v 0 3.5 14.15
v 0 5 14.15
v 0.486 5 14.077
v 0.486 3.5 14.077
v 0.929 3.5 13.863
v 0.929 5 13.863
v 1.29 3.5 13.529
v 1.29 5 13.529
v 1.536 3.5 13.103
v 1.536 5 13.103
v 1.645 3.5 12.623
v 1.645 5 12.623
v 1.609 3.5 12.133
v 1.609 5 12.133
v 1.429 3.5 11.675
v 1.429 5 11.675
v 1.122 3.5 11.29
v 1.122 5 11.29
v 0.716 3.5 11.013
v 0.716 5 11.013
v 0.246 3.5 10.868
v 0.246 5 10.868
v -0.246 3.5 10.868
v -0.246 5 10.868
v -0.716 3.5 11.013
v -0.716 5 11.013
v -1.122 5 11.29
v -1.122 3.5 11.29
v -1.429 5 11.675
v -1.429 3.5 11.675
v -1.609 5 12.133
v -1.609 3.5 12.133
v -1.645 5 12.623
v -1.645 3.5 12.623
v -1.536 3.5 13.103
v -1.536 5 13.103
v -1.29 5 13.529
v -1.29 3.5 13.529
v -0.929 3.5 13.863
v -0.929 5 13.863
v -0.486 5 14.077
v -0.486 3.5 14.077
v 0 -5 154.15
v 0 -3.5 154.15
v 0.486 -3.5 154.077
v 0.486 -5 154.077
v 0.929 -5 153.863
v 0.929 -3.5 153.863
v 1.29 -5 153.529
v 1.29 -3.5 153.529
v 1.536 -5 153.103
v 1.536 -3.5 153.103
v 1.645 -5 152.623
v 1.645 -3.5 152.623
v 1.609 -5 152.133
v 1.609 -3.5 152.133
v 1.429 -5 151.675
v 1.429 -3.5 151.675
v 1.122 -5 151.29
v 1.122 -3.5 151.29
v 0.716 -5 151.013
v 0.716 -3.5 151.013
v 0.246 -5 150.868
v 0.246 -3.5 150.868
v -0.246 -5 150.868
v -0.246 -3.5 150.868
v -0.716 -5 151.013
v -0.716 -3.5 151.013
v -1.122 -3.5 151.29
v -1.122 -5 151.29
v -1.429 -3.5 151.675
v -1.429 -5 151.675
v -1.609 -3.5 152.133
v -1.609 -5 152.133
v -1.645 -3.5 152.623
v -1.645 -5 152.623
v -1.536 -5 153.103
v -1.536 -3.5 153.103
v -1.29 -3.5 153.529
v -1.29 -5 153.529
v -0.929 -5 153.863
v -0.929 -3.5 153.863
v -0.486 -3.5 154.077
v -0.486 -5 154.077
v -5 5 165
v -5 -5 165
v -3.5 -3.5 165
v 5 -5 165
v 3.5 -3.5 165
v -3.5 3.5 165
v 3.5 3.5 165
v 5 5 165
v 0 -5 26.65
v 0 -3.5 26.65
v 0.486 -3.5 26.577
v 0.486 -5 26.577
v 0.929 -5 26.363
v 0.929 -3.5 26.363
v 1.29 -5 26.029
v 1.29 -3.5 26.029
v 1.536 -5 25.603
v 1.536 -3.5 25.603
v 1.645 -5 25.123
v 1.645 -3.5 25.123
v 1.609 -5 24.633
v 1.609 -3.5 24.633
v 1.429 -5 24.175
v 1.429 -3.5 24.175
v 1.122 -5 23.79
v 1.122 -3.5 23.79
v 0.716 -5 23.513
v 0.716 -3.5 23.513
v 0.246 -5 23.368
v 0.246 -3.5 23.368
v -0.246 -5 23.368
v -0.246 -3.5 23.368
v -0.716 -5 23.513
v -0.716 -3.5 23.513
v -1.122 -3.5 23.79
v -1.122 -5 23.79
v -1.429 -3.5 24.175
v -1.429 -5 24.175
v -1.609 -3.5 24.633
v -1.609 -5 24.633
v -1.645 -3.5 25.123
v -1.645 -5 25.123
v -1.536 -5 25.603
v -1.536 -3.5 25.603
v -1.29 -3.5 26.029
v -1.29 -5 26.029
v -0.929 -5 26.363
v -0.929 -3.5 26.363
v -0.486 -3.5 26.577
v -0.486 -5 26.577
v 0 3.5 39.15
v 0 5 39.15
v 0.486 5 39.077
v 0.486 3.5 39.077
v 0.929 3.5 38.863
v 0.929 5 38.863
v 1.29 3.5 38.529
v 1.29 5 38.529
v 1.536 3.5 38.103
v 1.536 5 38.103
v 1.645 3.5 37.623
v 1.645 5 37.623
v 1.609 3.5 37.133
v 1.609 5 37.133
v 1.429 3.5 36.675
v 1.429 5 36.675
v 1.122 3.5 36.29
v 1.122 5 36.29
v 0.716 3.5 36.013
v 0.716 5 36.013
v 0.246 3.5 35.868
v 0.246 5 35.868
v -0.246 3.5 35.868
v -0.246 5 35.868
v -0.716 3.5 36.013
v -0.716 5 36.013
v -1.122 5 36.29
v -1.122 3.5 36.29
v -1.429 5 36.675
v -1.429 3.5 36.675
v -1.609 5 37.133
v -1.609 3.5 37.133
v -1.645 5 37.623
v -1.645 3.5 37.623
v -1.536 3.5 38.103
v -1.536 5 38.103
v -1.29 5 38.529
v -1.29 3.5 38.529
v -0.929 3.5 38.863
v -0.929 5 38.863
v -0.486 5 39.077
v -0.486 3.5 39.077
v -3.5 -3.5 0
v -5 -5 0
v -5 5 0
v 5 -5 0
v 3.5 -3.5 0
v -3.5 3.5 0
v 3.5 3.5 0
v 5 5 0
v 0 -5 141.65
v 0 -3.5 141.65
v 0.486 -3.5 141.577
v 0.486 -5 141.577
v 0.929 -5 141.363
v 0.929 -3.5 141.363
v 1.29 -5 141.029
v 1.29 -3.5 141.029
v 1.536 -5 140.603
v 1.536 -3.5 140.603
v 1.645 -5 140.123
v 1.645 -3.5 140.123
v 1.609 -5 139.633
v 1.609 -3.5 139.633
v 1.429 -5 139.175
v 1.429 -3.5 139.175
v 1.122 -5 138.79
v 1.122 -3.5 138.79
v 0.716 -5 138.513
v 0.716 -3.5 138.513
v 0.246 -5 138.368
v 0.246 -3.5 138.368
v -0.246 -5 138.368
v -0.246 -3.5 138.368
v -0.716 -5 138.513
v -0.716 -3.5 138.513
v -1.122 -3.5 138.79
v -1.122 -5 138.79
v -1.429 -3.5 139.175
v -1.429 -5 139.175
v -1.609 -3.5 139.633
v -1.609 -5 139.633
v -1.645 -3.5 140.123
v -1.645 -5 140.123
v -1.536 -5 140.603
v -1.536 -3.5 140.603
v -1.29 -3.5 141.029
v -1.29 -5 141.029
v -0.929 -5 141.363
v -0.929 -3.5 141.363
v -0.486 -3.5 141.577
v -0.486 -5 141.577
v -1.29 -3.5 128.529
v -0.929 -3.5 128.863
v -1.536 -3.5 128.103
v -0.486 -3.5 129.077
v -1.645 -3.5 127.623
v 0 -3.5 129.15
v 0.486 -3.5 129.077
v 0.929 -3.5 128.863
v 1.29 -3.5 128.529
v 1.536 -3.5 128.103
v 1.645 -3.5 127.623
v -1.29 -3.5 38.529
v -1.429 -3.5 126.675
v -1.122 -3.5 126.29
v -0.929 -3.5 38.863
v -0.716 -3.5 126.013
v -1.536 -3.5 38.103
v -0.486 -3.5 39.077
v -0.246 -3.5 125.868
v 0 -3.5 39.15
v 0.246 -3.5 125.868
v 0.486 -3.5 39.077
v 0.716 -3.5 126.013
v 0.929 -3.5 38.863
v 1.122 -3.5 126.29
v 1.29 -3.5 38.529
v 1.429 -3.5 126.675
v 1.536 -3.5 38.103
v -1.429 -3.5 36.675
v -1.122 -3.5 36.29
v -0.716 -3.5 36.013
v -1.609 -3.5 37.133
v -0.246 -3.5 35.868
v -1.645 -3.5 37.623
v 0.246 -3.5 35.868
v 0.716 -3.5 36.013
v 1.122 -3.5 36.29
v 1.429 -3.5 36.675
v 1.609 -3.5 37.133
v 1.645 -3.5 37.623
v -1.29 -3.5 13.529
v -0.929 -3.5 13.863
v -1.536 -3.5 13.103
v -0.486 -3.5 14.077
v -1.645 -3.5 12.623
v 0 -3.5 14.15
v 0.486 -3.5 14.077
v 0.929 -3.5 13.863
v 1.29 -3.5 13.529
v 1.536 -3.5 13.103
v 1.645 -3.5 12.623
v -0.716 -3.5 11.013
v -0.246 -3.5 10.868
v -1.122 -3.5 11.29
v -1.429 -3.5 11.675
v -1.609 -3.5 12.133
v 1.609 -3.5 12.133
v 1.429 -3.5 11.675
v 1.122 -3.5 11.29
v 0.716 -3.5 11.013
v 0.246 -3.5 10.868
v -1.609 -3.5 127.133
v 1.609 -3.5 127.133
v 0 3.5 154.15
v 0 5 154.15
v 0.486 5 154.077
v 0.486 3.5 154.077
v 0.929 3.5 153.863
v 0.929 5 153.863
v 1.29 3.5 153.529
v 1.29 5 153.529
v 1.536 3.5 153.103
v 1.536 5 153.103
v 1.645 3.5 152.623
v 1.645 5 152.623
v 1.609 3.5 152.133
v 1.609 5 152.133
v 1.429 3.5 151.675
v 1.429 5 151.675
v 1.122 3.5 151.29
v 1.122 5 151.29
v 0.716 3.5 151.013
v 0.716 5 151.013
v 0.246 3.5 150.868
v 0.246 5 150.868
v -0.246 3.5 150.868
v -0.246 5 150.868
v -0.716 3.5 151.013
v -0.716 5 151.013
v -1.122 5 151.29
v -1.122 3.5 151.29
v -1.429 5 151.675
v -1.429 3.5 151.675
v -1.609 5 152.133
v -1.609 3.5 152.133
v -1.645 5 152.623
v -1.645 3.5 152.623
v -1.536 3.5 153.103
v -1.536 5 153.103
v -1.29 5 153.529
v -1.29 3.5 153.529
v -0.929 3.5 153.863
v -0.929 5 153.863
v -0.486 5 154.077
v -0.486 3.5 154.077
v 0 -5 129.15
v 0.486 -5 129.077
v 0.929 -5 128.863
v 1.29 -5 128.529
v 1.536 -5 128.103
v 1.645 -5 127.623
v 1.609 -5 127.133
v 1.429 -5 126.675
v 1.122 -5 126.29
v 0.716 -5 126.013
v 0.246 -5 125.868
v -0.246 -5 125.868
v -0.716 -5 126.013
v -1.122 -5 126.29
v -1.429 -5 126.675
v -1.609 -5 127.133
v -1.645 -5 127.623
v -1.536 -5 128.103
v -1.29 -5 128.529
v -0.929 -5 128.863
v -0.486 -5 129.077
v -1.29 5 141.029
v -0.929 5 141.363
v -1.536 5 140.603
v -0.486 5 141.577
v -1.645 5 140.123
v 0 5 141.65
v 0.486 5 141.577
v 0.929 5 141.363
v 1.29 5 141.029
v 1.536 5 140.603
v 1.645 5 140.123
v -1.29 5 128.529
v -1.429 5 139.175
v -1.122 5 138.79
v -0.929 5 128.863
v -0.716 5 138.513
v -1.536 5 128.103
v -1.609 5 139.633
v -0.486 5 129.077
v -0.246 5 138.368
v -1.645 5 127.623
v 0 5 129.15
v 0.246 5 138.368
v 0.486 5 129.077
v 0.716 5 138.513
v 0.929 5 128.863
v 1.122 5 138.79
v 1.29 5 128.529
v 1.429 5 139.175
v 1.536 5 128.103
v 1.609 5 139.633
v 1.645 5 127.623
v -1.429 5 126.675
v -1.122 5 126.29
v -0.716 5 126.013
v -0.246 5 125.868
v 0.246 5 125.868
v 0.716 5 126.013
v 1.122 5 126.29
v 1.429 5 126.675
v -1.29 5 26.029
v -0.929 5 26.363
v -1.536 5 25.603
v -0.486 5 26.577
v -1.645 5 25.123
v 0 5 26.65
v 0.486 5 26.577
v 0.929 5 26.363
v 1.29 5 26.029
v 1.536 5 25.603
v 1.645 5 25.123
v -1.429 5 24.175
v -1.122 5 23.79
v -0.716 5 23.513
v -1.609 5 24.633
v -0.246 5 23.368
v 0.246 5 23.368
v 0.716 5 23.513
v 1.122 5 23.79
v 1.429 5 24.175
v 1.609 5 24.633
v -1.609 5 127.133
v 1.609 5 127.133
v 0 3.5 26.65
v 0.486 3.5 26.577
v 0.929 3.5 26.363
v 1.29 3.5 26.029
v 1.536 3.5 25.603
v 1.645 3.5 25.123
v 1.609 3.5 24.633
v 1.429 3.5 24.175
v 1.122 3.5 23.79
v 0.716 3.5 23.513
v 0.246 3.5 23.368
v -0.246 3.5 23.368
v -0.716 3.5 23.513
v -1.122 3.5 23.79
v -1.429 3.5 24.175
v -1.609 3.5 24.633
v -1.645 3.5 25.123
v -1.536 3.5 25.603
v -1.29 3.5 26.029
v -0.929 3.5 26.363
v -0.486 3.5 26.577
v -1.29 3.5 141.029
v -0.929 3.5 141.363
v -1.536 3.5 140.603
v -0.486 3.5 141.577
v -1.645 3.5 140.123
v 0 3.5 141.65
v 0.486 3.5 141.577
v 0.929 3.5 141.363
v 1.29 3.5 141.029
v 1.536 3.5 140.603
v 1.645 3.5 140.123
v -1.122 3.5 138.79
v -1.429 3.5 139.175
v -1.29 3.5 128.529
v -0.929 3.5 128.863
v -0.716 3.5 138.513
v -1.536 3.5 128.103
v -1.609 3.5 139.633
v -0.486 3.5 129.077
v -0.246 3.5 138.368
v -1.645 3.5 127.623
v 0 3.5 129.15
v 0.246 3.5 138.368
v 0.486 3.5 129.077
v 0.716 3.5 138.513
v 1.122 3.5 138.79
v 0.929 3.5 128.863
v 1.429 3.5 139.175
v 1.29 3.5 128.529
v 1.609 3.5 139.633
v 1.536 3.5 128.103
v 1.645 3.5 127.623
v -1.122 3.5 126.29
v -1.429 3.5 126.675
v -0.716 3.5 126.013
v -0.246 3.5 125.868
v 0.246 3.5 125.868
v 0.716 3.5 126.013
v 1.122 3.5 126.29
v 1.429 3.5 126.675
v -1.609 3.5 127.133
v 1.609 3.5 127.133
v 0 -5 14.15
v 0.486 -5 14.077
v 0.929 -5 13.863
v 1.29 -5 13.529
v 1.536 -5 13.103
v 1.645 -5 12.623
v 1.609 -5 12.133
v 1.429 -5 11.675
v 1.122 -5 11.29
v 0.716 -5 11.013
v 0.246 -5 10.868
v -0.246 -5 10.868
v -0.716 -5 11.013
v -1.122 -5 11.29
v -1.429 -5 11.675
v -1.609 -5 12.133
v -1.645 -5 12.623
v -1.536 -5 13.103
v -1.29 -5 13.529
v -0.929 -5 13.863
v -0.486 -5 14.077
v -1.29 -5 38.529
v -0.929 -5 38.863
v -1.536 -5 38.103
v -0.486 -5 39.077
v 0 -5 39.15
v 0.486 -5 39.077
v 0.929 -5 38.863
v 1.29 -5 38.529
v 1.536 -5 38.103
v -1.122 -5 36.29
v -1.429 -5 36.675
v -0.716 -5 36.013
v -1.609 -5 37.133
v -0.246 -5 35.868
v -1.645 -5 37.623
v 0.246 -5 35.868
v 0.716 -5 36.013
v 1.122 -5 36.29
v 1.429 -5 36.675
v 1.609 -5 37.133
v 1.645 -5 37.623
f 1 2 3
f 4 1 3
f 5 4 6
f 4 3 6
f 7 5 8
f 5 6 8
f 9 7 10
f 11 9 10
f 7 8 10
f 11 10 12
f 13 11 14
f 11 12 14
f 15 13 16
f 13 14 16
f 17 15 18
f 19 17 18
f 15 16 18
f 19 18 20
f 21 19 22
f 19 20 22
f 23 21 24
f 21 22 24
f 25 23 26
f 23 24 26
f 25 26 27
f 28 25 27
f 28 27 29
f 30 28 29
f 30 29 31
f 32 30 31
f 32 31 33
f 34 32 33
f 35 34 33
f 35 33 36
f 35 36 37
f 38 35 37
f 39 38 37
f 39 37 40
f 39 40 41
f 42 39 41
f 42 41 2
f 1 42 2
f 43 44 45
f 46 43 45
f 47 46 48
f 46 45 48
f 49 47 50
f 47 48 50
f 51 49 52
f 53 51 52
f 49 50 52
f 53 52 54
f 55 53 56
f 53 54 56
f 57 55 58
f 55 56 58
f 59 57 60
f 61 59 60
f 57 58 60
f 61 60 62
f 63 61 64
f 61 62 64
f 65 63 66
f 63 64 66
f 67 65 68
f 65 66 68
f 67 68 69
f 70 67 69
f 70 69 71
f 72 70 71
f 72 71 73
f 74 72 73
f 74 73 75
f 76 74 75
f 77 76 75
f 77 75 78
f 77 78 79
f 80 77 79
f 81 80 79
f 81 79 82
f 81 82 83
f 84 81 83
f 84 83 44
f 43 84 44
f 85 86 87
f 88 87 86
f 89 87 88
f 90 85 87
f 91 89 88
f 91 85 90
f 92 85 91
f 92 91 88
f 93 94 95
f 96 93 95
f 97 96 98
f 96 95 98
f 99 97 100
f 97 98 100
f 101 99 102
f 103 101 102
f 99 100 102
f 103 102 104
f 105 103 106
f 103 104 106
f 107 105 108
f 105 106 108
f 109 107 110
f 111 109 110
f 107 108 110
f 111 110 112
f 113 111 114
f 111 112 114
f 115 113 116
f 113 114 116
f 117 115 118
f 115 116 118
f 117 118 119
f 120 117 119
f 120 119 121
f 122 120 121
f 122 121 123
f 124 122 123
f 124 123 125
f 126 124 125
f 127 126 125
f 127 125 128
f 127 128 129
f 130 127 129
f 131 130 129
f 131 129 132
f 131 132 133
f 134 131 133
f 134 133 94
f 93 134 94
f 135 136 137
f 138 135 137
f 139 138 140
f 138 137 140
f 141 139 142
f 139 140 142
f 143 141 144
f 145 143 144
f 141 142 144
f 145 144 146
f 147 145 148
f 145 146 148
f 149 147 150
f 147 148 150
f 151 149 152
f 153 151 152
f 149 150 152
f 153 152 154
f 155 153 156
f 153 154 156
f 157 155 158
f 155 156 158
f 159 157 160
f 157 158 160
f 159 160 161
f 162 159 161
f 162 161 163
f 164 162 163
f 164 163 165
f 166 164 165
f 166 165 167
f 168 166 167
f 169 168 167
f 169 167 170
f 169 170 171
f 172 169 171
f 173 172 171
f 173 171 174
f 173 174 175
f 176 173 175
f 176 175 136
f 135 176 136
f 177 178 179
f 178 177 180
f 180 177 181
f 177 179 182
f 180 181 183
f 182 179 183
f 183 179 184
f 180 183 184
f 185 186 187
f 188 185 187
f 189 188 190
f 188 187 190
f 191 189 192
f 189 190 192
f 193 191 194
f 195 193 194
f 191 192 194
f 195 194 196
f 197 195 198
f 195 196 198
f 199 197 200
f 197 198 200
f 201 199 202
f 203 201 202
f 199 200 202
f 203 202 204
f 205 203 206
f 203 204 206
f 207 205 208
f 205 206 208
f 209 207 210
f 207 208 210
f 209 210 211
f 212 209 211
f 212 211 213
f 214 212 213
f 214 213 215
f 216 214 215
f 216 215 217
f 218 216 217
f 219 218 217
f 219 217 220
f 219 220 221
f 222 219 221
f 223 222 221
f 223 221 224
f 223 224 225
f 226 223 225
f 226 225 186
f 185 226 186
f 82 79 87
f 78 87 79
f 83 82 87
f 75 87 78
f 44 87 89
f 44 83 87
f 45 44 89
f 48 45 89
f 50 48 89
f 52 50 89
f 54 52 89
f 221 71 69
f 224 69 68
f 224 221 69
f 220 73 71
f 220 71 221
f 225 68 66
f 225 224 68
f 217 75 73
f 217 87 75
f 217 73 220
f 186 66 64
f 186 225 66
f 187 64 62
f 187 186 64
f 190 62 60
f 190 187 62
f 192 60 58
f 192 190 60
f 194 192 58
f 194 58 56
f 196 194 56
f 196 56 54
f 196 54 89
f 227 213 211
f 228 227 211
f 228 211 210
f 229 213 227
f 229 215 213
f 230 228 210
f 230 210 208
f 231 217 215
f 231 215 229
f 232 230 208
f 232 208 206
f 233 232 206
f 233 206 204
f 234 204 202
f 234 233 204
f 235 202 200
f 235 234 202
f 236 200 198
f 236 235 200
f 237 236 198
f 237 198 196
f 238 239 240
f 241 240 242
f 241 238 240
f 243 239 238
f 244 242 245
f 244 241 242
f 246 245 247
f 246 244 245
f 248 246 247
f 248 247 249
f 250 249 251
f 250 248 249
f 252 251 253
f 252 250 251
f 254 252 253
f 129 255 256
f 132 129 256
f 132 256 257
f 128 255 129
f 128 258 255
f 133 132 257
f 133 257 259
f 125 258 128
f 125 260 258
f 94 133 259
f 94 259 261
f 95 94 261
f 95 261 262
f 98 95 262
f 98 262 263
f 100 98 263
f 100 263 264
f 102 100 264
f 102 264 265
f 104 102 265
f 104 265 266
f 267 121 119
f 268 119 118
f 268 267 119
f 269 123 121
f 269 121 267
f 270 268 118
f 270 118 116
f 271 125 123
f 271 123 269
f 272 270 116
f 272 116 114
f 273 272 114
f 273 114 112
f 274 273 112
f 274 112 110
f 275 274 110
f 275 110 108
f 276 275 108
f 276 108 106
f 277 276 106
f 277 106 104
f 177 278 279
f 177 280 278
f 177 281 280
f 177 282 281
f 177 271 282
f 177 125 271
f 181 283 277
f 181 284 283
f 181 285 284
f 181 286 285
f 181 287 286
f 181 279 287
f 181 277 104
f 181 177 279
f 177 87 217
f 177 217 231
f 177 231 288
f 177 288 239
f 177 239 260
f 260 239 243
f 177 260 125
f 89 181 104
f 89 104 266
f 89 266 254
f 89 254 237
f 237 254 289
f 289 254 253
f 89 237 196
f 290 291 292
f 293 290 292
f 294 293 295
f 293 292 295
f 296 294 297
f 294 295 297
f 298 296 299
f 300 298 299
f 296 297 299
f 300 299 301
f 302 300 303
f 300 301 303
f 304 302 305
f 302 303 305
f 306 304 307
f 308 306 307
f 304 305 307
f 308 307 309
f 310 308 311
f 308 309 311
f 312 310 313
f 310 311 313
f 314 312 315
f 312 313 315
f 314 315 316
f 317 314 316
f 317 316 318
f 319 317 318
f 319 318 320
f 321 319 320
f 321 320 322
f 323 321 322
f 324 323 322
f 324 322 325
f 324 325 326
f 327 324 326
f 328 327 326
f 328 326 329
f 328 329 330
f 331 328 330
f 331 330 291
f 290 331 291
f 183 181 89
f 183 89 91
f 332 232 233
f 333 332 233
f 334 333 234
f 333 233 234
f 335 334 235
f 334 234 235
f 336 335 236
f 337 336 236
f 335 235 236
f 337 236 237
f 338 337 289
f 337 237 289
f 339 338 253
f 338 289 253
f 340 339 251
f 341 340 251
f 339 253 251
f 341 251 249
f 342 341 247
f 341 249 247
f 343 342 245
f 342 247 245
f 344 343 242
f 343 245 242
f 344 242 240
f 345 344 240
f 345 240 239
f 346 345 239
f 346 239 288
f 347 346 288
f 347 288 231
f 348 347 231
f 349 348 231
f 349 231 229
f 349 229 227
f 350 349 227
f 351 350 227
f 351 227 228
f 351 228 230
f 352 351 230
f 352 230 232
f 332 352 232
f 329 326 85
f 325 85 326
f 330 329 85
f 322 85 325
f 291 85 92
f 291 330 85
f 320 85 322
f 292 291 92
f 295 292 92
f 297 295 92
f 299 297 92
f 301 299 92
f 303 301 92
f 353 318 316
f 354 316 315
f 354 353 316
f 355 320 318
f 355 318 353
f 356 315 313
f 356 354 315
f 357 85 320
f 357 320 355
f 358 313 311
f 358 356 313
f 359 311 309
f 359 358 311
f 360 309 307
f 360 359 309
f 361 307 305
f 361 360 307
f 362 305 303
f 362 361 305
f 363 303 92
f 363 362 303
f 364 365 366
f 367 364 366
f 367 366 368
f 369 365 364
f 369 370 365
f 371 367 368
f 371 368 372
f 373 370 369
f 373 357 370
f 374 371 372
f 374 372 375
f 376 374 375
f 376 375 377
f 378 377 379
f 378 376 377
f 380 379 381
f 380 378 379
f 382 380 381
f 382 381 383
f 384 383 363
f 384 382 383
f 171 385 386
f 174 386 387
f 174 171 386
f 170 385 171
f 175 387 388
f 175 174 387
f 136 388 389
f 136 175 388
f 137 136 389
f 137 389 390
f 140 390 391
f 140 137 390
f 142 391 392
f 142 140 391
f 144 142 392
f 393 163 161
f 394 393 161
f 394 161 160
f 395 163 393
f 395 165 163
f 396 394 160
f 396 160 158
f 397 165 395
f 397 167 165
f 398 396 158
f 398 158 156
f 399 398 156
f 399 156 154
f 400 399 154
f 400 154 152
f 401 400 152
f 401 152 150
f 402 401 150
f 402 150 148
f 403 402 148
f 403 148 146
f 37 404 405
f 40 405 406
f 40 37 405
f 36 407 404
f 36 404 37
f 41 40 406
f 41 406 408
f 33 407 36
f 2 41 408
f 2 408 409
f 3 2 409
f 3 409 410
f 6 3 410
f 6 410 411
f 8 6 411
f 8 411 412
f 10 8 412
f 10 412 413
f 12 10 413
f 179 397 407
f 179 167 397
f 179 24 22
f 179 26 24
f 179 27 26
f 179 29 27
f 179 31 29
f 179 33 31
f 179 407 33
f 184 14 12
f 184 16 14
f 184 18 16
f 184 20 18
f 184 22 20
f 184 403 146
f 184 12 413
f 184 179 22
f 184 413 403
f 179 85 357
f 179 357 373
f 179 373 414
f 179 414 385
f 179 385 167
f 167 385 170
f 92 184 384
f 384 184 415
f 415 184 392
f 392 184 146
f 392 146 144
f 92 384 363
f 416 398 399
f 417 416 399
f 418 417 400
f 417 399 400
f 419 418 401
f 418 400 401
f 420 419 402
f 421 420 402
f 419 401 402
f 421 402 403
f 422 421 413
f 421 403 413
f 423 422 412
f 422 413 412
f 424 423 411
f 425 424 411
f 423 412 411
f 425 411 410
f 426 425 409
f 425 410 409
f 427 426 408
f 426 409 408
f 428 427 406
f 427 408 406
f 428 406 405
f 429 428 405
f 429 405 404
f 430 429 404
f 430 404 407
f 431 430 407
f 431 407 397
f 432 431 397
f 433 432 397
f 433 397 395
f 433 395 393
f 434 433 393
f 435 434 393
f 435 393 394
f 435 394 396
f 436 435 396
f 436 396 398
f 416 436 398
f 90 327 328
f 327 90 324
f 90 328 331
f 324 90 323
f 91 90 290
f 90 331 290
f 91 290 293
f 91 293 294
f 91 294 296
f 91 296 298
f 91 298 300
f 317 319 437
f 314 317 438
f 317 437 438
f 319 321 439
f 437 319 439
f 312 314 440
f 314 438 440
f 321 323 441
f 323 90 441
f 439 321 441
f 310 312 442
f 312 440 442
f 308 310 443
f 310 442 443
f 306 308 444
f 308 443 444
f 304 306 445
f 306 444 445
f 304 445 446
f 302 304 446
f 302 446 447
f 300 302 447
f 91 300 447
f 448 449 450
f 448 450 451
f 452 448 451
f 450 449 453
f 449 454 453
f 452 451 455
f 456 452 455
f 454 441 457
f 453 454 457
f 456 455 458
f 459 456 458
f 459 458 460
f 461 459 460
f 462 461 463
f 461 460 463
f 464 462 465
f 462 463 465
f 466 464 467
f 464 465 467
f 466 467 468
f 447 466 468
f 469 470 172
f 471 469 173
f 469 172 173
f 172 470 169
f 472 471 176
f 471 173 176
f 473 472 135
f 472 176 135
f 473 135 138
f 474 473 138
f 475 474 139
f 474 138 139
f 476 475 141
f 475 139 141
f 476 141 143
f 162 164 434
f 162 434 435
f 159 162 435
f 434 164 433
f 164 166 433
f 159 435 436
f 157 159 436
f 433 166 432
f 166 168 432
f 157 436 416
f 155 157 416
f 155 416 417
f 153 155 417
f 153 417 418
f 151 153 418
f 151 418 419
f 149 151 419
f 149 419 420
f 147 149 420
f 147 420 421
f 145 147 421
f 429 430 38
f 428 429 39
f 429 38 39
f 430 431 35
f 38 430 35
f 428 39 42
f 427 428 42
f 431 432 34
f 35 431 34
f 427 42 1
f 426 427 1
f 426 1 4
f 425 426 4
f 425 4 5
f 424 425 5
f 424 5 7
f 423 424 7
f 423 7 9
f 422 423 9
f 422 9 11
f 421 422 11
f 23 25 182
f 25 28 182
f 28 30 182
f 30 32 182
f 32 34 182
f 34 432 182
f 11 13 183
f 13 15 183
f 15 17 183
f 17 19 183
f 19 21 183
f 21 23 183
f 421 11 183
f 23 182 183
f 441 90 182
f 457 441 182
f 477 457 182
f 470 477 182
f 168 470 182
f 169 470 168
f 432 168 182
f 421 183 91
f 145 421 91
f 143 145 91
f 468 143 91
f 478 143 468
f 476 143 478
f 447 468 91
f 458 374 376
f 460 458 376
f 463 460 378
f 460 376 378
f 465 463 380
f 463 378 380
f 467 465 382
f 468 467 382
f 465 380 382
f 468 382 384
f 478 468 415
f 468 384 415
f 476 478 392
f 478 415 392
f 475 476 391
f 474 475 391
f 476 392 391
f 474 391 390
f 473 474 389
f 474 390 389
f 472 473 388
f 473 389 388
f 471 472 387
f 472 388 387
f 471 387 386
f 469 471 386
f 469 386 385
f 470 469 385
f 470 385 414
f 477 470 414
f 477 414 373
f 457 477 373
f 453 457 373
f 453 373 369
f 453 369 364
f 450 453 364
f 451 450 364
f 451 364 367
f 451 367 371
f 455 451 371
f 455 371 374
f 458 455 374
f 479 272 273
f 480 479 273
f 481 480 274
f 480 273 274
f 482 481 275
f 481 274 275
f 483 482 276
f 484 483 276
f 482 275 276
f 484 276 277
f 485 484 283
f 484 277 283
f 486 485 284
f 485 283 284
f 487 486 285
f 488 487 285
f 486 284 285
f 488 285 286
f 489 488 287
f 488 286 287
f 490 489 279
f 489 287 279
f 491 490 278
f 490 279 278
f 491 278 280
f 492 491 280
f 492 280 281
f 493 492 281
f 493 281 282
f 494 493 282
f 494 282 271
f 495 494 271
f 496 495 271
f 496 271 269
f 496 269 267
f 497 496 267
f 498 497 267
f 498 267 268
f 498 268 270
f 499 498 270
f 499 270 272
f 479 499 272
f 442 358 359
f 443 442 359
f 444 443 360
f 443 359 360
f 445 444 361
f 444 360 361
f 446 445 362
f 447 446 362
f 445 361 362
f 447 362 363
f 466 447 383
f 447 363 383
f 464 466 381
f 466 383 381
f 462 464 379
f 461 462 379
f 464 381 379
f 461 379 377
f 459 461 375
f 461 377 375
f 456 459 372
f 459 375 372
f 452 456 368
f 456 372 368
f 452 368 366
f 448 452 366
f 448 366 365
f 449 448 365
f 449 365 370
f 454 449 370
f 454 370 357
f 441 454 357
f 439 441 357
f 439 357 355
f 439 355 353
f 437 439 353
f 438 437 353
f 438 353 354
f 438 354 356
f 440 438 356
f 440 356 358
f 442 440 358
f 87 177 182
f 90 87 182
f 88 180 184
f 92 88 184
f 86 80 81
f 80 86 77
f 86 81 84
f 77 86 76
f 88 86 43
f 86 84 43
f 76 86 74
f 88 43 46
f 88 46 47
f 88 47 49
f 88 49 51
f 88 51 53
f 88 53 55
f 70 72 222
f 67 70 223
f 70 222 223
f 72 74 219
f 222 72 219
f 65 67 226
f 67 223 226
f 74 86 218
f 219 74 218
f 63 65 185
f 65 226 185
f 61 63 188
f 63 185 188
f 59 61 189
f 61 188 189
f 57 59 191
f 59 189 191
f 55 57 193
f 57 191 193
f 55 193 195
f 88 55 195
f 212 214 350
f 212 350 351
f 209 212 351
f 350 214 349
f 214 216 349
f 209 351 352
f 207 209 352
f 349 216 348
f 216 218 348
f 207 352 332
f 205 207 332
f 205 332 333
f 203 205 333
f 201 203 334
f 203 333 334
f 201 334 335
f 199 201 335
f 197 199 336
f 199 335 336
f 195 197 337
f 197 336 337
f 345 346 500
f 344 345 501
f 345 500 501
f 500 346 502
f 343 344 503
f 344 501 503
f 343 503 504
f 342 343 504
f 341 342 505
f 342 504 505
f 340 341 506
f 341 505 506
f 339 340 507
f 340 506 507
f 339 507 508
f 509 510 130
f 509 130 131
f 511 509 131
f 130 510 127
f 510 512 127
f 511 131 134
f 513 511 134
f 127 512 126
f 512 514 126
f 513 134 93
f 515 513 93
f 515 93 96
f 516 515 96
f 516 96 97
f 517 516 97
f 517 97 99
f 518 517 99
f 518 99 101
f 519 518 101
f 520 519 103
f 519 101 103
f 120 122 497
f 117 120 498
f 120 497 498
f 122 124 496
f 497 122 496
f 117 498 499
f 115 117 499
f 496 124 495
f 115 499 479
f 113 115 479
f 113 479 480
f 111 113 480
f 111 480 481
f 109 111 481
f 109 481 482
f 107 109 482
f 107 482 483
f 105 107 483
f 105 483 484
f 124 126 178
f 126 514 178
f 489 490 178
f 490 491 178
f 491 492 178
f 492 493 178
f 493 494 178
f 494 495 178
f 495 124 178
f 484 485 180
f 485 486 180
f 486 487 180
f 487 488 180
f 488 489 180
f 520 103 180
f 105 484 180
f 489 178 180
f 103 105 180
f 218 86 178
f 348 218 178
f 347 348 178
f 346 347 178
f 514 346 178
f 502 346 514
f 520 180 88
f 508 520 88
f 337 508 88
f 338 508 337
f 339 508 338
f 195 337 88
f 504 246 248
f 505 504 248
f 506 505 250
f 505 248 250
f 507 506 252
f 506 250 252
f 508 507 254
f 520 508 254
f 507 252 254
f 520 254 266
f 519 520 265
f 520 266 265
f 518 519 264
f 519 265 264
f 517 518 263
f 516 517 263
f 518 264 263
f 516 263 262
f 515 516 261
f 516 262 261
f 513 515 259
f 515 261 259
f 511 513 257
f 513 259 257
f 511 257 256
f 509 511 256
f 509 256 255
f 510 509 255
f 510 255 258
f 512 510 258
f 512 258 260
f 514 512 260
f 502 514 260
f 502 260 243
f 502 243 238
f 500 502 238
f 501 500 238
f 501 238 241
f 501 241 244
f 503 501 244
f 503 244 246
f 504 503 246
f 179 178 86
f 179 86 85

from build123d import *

# Parameters (mm, degrees)
SKETCH_1_W          = 10
SKETCH_1_H          = 10
SKETCH_1_W_2        = 7
SKETCH_1_H_2        = 7
EXTRUDE_1_DEPTH     = 165
SKETCH_2_R          = 1.65
CUT_EXTRUDE_1_DEPTH = 166.378354085


with BuildPart() as part:
    # 草图1 → 凸台-拉伸1 (new body)
    with BuildSketch(Plane.XY):
        Rectangle(SKETCH_1_W, SKETCH_1_H)
        Rectangle(SKETCH_1_W_2, SKETCH_1_H_2, mode=Mode.SUBTRACT)
    extrude(amount=EXTRUDE_1_DEPTH)

    # 草图2 → 切除-拉伸1 (cut, through all)
    with BuildSketch(Plane(origin=(0, 5, 0), x_dir=(1, 0, 0), z_dir=(0, 1, 0))):
        with Locations(Location((0, -12.5, 0), (0, 0, 270))):
            Circle(SKETCH_2_R)
        with Locations(Location((0, -25, 0), (0, 0, 270))):
            Circle(SKETCH_2_R)
        with Locations(Location((0, -37.5, 0), (0, 0, 270))):
            Circle(SKETCH_2_R)
        with Locations(Location((0, -127.5, 0), (0, 0, 270))):
            Circle(SKETCH_2_R)
        with Locations(Location((0, -140, 0), (0, 0, 270))):
            Circle(SKETCH_2_R)
        with Locations(Location((0, -152.5, 0), (0, 0, 270))):
            Circle(SKETCH_2_R)
    extrude(amount=-CUT_EXTRUDE_1_DEPTH, mode=Mode.SUBTRACT)


solid = part.part
